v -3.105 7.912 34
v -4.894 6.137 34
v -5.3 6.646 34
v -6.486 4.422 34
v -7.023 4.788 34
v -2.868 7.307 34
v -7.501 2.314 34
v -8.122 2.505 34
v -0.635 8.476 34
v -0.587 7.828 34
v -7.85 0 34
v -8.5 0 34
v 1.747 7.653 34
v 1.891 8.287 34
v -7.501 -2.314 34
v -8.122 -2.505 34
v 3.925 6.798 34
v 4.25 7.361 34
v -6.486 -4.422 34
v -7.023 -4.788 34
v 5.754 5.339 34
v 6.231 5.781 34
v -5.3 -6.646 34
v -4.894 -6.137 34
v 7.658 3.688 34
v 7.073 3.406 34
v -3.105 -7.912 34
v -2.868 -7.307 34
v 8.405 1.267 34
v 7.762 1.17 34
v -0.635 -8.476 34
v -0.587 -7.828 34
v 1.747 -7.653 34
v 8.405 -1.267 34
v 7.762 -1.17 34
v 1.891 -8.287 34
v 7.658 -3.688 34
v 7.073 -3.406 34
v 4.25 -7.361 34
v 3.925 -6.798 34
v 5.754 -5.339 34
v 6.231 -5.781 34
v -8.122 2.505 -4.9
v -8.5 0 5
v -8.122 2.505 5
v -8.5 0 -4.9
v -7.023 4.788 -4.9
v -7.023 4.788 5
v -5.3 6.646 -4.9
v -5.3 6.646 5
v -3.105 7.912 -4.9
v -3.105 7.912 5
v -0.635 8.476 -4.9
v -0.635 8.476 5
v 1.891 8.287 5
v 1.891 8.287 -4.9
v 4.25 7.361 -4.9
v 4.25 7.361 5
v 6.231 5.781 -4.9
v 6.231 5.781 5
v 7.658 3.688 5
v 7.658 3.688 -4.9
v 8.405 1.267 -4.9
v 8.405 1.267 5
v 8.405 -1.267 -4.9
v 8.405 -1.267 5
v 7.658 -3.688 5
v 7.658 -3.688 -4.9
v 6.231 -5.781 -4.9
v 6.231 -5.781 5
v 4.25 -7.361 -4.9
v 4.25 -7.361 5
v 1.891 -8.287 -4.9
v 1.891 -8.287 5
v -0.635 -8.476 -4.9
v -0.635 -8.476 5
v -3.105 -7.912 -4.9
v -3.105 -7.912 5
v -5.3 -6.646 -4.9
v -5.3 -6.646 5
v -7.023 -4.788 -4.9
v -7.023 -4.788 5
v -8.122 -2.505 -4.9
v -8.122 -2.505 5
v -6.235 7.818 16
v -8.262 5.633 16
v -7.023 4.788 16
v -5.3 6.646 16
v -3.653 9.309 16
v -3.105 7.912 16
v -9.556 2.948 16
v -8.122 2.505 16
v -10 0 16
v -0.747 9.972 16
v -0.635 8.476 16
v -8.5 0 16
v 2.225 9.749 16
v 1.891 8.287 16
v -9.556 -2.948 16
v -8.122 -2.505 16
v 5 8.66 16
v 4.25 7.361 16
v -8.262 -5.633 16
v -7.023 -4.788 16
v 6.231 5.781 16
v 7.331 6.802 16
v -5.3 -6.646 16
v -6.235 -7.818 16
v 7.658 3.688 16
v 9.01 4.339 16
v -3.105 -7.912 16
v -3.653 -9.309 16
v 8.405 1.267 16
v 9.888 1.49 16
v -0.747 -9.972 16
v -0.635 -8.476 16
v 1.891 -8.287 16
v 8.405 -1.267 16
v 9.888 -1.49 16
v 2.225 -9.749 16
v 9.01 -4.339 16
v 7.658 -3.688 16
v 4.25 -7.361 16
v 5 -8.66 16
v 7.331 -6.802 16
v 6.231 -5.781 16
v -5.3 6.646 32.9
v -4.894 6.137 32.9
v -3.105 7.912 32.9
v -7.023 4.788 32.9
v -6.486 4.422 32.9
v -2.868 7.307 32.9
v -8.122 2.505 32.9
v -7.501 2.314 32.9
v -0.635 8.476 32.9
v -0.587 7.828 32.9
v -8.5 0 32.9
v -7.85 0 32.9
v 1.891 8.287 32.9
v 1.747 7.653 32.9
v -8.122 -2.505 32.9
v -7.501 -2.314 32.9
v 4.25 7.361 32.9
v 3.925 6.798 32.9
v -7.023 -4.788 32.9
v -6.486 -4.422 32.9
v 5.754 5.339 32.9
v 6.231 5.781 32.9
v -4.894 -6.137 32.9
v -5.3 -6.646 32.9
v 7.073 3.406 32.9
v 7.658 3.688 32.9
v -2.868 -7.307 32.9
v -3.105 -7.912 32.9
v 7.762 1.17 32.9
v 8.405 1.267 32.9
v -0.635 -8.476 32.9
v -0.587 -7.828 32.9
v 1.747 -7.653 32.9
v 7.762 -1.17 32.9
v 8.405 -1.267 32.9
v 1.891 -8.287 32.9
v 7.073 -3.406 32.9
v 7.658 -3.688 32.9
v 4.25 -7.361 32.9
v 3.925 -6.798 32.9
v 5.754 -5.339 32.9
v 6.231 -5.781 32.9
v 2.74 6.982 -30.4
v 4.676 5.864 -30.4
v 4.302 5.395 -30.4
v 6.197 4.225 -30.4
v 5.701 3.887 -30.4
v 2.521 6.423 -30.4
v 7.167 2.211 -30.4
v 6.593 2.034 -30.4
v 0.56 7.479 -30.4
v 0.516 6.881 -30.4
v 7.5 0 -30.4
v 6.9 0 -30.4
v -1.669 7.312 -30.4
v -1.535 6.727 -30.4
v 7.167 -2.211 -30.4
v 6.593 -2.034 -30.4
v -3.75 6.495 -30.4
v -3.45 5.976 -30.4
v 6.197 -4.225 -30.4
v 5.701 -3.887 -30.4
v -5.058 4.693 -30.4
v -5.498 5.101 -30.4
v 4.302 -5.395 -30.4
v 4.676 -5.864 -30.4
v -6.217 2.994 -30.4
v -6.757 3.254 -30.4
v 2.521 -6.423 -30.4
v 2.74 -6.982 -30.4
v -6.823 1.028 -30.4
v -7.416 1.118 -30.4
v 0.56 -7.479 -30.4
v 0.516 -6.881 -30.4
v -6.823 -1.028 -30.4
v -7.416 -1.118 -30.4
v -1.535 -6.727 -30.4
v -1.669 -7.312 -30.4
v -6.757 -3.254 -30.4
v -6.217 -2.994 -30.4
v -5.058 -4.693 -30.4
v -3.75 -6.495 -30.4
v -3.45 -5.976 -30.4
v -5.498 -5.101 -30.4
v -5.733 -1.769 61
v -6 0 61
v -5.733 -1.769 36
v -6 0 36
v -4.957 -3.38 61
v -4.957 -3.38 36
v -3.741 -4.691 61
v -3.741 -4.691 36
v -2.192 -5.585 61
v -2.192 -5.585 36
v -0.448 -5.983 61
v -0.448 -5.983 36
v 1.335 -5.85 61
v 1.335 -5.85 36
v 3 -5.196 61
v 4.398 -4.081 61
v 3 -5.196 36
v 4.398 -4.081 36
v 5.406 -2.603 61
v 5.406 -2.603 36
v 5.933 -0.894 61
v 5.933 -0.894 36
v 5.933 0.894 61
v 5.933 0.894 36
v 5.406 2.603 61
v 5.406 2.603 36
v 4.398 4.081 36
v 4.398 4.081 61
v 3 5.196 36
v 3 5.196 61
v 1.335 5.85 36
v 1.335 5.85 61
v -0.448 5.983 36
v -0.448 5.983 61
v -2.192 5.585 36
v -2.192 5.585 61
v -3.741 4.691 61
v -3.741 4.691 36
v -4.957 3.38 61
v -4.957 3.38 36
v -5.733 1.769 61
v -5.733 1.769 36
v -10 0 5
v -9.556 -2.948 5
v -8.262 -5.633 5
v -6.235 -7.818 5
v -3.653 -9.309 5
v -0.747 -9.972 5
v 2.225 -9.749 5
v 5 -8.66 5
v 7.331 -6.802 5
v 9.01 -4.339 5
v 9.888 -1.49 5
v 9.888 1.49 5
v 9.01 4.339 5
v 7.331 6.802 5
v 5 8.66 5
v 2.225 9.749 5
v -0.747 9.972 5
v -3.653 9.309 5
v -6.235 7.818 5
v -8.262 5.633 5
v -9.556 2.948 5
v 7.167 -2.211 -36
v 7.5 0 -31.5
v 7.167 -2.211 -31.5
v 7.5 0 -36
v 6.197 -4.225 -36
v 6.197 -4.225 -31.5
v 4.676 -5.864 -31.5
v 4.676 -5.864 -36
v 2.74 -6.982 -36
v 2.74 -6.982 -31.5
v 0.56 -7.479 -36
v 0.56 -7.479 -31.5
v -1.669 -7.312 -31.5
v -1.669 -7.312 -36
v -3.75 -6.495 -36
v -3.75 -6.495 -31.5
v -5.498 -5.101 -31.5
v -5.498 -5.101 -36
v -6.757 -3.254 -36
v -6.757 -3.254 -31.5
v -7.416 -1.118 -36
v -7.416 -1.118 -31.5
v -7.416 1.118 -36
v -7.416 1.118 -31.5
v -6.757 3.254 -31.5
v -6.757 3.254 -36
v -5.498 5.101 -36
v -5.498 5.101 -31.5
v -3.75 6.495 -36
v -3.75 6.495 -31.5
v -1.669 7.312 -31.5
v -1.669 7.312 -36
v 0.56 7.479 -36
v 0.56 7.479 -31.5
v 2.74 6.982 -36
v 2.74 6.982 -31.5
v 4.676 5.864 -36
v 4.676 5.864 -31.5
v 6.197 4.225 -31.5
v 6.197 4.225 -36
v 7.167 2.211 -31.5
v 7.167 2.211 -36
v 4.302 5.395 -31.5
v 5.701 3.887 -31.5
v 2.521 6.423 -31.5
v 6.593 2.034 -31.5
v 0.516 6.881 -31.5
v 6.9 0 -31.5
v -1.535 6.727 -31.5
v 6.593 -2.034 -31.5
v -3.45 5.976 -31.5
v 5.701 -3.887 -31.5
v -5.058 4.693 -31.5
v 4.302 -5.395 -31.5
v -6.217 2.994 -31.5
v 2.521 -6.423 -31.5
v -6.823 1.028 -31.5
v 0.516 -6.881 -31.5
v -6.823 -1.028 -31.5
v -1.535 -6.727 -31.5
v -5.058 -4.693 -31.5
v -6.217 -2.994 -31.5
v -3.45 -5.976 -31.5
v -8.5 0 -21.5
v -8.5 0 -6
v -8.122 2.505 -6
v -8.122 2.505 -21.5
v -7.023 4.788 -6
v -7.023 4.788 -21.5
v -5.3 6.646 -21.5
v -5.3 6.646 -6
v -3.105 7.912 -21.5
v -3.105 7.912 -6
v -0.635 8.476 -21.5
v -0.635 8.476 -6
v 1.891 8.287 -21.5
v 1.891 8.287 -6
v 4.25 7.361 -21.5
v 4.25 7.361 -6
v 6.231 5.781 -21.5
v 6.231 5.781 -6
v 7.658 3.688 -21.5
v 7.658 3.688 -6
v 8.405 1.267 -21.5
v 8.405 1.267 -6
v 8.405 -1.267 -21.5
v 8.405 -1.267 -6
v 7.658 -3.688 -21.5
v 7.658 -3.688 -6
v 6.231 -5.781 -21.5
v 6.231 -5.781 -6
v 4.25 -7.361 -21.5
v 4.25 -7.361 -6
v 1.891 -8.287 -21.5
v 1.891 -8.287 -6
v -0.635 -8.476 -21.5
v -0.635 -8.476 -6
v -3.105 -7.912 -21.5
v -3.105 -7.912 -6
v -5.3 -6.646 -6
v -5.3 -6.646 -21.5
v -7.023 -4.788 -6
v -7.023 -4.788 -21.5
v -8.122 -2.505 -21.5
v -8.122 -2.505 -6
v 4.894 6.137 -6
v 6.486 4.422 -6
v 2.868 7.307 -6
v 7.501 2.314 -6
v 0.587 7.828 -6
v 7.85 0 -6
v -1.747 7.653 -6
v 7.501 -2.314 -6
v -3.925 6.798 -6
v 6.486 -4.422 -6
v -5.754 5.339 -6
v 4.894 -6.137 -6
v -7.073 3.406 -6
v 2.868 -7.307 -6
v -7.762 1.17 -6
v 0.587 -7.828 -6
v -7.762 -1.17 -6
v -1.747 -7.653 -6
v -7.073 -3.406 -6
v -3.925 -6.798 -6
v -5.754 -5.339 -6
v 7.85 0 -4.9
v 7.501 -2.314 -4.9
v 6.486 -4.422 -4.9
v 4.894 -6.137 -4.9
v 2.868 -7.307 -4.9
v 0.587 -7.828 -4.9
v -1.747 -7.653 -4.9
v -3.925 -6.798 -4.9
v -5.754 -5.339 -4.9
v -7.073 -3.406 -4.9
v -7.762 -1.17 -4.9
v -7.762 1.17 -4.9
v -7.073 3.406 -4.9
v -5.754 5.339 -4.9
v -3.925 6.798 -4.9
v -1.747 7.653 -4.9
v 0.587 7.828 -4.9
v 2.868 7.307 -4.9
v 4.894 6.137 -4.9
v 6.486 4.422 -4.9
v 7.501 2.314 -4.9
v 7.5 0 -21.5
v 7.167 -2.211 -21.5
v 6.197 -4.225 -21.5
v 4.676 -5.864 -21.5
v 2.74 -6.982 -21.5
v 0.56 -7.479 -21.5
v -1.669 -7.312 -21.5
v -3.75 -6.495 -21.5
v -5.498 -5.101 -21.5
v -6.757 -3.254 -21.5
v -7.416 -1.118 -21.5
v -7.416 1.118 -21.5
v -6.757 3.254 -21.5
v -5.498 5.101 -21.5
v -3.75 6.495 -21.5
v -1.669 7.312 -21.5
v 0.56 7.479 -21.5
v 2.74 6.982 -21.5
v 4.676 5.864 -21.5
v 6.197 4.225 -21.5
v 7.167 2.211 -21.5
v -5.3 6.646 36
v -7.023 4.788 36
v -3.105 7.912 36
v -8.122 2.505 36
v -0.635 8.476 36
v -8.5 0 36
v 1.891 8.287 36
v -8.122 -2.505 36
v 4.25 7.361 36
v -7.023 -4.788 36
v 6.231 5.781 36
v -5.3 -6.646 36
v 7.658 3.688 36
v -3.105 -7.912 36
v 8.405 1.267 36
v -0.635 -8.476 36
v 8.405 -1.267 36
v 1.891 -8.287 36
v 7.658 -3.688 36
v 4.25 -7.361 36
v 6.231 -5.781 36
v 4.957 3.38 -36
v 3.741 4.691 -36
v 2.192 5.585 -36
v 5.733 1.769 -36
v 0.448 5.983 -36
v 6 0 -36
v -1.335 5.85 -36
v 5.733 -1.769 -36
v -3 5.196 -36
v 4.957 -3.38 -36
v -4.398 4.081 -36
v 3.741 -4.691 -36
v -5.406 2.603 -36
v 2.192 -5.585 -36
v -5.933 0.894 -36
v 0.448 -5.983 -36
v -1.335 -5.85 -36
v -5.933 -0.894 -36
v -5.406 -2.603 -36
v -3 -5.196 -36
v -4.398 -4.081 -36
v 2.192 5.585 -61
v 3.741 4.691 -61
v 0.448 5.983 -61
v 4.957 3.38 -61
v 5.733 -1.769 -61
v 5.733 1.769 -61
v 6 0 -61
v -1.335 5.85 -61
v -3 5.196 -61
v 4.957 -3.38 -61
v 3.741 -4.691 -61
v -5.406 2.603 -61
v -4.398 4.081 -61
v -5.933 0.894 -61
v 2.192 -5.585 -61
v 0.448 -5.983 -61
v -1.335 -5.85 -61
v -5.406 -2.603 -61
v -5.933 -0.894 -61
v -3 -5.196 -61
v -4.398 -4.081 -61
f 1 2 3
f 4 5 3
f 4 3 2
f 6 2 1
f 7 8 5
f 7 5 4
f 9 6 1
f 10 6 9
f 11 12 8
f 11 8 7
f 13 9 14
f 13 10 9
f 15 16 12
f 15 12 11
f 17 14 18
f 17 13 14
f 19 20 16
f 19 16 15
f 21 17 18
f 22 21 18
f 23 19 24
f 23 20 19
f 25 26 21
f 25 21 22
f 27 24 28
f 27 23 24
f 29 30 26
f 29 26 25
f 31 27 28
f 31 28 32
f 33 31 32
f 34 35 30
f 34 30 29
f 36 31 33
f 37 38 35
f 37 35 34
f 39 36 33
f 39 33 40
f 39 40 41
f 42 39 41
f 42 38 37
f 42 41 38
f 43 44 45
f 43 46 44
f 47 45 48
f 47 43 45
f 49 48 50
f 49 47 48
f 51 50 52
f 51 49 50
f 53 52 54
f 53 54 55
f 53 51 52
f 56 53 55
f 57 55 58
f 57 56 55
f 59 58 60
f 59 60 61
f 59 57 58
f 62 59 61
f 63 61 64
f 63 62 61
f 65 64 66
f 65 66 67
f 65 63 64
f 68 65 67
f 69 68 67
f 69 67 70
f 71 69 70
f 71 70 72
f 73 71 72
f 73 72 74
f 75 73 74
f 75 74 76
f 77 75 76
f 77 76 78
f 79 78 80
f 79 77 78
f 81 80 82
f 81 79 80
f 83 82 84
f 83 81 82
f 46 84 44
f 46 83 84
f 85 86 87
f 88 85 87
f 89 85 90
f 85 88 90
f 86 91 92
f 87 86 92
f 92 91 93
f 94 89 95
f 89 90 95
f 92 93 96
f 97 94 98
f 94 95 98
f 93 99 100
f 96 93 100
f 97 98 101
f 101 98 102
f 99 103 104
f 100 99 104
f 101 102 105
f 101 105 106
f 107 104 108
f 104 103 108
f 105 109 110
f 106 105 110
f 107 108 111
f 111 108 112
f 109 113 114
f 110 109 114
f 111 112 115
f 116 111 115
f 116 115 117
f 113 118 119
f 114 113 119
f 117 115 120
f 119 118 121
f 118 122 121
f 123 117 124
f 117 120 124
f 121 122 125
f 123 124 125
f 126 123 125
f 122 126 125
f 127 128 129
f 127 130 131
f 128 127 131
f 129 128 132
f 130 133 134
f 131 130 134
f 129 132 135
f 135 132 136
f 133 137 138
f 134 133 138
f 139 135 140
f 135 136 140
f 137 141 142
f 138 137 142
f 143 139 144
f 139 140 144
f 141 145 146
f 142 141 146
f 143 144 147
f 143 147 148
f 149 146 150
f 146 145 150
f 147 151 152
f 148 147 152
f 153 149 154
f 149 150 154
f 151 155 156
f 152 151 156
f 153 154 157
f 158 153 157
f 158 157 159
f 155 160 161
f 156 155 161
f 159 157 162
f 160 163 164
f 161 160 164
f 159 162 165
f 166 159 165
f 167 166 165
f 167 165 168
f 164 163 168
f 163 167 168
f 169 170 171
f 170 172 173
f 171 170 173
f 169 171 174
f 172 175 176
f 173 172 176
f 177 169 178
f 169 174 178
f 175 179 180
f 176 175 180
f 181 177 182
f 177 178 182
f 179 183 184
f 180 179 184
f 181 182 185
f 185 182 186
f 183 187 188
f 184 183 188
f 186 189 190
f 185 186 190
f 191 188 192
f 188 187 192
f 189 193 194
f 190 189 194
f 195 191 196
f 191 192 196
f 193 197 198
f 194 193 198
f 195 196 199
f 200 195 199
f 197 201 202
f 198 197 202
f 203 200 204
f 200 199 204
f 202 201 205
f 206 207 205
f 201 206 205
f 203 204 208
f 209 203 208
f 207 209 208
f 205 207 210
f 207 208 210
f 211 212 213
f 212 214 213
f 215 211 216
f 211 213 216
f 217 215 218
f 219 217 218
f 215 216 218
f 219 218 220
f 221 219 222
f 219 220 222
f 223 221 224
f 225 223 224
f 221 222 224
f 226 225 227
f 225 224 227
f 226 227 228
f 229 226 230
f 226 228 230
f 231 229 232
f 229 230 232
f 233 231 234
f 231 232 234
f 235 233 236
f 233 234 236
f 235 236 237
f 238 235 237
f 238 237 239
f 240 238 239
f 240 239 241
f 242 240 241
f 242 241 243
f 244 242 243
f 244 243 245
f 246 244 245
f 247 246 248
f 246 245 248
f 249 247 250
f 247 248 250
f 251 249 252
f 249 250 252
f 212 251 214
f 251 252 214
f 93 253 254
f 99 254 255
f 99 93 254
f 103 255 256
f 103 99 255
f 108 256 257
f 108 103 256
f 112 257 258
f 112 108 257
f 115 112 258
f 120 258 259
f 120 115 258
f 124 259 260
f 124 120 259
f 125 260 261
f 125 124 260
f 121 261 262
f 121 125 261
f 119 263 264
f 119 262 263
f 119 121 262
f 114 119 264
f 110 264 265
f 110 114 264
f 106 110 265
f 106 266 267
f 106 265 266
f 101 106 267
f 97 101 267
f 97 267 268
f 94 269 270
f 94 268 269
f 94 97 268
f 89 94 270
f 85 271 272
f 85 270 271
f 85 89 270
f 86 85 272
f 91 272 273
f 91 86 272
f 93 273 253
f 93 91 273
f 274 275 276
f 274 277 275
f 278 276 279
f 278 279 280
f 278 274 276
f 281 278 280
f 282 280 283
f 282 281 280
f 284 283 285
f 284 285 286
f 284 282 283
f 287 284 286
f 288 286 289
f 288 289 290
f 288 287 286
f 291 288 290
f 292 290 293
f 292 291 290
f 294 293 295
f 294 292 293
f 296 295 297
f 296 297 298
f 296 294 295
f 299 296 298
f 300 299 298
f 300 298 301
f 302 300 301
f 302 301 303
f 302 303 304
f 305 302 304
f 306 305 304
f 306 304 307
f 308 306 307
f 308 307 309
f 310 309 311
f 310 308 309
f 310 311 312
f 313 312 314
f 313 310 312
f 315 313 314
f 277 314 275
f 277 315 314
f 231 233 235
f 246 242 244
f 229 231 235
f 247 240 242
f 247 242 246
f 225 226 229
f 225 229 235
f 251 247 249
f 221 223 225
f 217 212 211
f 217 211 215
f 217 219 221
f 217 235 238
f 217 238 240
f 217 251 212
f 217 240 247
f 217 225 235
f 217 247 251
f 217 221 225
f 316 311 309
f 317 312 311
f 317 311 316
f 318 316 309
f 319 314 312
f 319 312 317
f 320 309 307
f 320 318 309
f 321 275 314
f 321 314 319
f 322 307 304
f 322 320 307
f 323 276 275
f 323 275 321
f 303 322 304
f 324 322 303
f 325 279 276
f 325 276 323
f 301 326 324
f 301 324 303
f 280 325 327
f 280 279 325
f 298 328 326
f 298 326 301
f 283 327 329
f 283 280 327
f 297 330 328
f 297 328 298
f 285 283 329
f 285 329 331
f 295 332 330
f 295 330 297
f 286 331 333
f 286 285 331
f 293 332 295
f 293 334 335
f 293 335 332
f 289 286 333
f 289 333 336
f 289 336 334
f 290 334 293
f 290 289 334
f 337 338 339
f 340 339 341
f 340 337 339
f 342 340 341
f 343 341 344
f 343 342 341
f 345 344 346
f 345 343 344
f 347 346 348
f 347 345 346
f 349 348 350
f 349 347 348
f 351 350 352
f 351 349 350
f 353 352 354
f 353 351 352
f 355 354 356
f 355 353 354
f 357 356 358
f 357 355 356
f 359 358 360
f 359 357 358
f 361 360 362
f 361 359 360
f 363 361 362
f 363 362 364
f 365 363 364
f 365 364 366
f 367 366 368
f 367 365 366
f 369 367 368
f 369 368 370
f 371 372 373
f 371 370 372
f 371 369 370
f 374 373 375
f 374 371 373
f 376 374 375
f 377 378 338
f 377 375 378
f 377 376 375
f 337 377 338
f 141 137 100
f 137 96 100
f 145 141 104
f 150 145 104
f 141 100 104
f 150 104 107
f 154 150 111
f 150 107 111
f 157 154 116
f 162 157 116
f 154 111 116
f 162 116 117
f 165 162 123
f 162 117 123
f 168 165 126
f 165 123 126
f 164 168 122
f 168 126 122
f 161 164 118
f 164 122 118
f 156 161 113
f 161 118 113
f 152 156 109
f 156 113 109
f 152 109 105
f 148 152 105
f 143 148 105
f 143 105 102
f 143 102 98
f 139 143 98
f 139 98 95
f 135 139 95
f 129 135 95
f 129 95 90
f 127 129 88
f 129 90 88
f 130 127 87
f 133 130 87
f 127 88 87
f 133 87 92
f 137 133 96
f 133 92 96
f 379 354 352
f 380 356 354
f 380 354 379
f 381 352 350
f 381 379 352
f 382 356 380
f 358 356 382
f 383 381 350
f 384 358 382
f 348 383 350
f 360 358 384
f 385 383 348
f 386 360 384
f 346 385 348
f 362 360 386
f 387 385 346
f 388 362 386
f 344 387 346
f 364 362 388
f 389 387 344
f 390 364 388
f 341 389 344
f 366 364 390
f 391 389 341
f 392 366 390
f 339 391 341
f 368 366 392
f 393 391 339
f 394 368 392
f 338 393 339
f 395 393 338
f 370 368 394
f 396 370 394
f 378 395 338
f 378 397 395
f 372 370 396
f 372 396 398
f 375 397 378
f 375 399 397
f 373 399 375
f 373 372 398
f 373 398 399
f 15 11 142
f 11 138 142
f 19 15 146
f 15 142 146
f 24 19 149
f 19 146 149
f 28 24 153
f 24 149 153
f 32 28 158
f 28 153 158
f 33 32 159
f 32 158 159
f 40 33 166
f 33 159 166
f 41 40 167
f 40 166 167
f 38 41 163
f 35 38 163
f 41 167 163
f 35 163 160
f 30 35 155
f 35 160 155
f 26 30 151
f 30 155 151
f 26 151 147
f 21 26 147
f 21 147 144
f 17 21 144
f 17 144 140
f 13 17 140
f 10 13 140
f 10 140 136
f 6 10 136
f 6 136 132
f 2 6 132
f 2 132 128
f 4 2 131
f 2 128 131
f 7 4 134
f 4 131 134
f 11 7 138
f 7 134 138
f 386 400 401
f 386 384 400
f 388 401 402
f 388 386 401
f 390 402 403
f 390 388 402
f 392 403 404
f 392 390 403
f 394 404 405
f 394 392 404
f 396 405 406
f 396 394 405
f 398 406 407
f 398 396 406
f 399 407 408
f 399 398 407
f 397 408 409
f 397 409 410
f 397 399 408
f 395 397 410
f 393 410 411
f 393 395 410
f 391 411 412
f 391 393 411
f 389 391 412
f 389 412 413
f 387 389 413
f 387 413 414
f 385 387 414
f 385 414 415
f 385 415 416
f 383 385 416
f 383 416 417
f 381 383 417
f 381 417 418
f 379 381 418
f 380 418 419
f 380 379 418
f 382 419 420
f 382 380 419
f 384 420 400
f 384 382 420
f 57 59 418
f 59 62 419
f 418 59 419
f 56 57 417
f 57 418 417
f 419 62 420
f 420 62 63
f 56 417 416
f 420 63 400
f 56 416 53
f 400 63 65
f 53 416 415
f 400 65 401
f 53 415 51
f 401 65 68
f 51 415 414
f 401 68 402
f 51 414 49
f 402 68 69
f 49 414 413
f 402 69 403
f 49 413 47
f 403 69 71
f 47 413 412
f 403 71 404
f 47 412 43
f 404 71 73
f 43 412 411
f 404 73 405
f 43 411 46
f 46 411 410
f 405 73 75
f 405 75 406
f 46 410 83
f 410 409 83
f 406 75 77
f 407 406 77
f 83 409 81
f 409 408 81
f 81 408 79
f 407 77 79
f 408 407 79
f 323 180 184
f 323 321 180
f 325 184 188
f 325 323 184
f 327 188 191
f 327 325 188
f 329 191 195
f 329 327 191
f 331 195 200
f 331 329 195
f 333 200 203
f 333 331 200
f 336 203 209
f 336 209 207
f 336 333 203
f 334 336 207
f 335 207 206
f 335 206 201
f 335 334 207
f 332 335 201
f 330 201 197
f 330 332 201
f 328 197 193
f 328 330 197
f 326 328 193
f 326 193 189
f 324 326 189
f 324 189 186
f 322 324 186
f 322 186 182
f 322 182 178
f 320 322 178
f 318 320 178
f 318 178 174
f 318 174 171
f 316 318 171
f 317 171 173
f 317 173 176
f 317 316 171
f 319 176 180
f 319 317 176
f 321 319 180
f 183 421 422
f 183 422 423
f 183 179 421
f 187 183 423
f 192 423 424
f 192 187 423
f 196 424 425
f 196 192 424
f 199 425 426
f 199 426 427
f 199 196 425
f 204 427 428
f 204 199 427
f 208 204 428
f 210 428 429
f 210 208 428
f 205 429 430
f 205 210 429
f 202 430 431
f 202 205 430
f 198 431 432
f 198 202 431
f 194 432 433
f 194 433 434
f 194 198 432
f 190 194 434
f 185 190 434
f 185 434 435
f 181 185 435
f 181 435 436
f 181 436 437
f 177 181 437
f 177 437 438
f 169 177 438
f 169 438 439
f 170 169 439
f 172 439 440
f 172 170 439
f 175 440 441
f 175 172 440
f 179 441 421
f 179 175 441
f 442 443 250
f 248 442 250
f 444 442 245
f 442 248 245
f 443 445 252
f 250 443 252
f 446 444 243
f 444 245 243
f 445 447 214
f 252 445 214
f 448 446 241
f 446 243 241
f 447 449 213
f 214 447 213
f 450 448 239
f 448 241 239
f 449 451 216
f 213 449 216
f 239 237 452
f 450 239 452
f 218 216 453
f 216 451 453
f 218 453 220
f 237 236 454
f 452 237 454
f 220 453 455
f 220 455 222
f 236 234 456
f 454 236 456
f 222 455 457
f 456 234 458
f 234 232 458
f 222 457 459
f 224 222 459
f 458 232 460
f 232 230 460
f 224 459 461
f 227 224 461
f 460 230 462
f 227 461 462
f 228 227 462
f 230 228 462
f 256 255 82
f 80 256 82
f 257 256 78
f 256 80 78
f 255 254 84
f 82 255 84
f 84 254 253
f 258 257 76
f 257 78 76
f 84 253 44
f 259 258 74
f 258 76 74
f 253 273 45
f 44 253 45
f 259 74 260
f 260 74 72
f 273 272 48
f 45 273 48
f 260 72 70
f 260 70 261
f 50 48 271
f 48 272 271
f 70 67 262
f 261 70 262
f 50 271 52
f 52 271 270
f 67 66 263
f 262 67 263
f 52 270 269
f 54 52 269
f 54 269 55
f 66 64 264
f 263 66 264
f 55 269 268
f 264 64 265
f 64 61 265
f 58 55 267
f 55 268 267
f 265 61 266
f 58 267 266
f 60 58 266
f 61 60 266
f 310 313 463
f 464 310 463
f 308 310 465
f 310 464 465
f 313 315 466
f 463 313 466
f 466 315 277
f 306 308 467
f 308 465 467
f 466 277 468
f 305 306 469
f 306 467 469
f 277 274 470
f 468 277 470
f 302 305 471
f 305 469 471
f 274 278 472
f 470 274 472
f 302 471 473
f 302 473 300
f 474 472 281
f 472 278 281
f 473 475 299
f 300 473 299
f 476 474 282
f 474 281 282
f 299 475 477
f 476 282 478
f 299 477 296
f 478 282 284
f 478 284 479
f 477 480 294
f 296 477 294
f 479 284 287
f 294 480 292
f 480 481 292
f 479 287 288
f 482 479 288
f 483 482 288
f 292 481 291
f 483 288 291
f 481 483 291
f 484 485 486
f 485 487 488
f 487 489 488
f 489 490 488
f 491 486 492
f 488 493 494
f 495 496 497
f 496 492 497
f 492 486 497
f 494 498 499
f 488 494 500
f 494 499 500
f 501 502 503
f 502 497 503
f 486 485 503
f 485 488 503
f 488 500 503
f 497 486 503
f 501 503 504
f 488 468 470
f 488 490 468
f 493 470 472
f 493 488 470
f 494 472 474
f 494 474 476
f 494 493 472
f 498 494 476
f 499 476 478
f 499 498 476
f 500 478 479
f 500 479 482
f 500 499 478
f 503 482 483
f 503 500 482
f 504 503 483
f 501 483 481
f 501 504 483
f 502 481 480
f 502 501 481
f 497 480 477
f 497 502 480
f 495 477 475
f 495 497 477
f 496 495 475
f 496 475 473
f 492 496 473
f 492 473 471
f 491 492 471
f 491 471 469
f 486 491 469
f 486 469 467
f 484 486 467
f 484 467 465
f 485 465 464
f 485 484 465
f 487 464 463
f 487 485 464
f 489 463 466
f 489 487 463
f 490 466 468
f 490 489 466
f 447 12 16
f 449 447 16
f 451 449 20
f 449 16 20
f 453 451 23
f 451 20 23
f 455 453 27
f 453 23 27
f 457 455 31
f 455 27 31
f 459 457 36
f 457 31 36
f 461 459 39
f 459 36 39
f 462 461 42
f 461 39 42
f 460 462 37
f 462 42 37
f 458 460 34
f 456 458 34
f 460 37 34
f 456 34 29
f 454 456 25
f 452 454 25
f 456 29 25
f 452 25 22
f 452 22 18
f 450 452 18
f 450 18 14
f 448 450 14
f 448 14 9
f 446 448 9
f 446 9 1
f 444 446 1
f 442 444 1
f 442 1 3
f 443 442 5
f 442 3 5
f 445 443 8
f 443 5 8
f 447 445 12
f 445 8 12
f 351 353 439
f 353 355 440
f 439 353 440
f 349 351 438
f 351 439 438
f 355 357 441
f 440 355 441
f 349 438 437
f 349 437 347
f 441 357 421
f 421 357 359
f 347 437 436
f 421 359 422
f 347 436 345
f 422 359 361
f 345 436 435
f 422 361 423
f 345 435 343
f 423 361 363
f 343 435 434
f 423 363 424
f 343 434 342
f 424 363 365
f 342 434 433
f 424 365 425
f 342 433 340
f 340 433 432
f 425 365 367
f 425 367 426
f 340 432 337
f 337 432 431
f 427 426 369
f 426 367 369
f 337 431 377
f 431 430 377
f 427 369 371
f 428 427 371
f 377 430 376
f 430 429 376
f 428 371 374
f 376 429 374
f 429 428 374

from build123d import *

# Parameters (mm, degrees)
SKETCH1_R           = 10
BOSS_EXTRUDE1_DEPTH = 61
SKETCH3_W           = 66
SKETCH3_H           = 1.5
SKETCH4_W           = 45
SKETCH4_H           = 1.5
SKETCH5_W           = 25
SKETCH5_H           = 2.5
SKETCH6_W           = 39.5
SKETCH6_H           = 1
SKETCH7_W           = 25
SKETCH7_H           = 1.5
SKETCH8_W           = 1.1
SKETCH8_H           = 0.6
SKETCH9_W           = 1.1
SKETCH9_H           = 0.65
SKETCH10_W          = 1.1
SKETCH10_H          = 0.65


with BuildPart() as part:
    # Sketch1 → Boss-Extrude1 (new, symmetric)
    with BuildSketch(Plane.XY):
        with Locations(Location((0, 0, 0), (0, 0, 180))):
            Circle(SKETCH1_R)
    extrude(amount=BOSS_EXTRUDE1_DEPTH, both=True)

    # Sketch3 → Cut-Revolve1 (revolve, cut)
    with BuildSketch(Plane(origin=(0, 0, 0), x_dir=(0, 0, -1), z_dir=(1, 0, 0)), mode=Mode.PRIVATE) as cut_revolve1_sk:
        with Locations((28, 9.25)):
            Rectangle(SKETCH3_W, SKETCH3_H)
    revolve(cut_revolve1_sk.sketch.rotate(Axis((0, 0, 0), (0, 0, -1)), 270), axis=Axis((0, 0, 0), (0, 0, -1)), mode=Mode.SUBTRACT)

    # Sketch4 → Cut-Revolve2 (revolve, cut)
    with BuildSketch(Plane(origin=(0, 0, 0), x_dir=(0, 0, -1), z_dir=(1, 0, 0)), mode=Mode.PRIVATE) as cut_revolve2_sk:
        with Locations((-38.5, 9.25)):
            Rectangle(SKETCH4_W, SKETCH4_H)
    revolve(cut_revolve2_sk.sketch.rotate(Axis((0, 0, 0), (0, 0, 1)), 90), axis=Axis((0, 0, 0), (0, 0, 1)), mode=Mode.SUBTRACT)

    # Sketch5 → Cut-Revolve3 (revolve, cut)
    with BuildSketch(Plane(origin=(0, 0, 0), x_dir=(0, 0, -1), z_dir=(1, 0, 0)), mode=Mode.PRIVATE) as cut_revolve3_sk:
        with Locations((-48.5, 7.25)):
            Rectangle(SKETCH5_W, SKETCH5_H)
    revolve(cut_revolve3_sk.sketch.rotate(Axis((0, 0, 0), (0, 0, 1)), 90), axis=Axis((0, 0, 0), (0, 0, 1)), mode=Mode.SUBTRACT)

    # Sketch6 → Cut-Revolve4 (revolve, cut)
    with BuildSketch(Plane(origin=(0, 0, 0), x_dir=(0, 0, -1), z_dir=(1, 0, 0)), mode=Mode.PRIVATE) as cut_revolve4_sk:
        with Locations((41.25, 8)):
            Rectangle(SKETCH6_W, SKETCH6_H)
    revolve(cut_revolve4_sk.sketch.rotate(Axis((0, 0, 0), (0, 0, -1)), 90), axis=Axis((0, 0, 0), (0, 0, -1)), mode=Mode.SUBTRACT)

    # Sketch7 → Cut-Revolve5 (revolve, cut)
    with BuildSketch(Plane(origin=(0, 0, 0), x_dir=(0, 0, -1), z_dir=(1, 0, 0)), mode=Mode.PRIVATE) as cut_revolve5_sk:
        with Locations((48.5, 6.75)):
            Rectangle(SKETCH7_W, SKETCH7_H)
    revolve(cut_revolve5_sk.sketch.rotate(Axis((0, 0, 0), (0, 0, -1)), 90), axis=Axis((0, 0, 0), (0, 0, -1)), mode=Mode.SUBTRACT)

    # Sketch8 → Cut-Revolve6 (revolve, cut)
    with BuildSketch(Plane(origin=(0, 0, 0), x_dir=(0, 0, -1), z_dir=(1, 0, 0)), mode=Mode.PRIVATE) as cut_revolve6_sk:
        with Locations((30.95, 7.2)):
            Rectangle(SKETCH8_W, SKETCH8_H)
    revolve(cut_revolve6_sk.sketch.rotate(Axis((0, 0, 0), (0, 0, -1)), 90), axis=Axis((0, 0, 0), (0, 0, -1)), mode=Mode.SUBTRACT)

    # Sketch9 → Cut-Revolve7 (revolve, cut)
    with BuildSketch(Plane(origin=(0, 0, 0), x_dir=(0, 0, -1), z_dir=(1, 0, 0)), mode=Mode.PRIVATE) as cut_revolve7_sk:
        with Locations((5.45, 8.175)):
            Rectangle(SKETCH9_W, SKETCH9_H)
    revolve(cut_revolve7_sk.sketch.rotate(Axis((0, 0, 0), (0, 0, -1)), 90), axis=Axis((0, 0, 0), (0, 0, -1)), mode=Mode.SUBTRACT)

    # Sketch10 → Cut-Revolve8 (revolve, cut)
    with BuildSketch(Plane(origin=(0, 0, 0), x_dir=(0, 0, -1), z_dir=(1, 0, 0)), mode=Mode.PRIVATE) as cut_revolve8_sk:
        with Locations((-33.45, 8.175)):
            Rectangle(SKETCH10_W, SKETCH10_H)
    revolve(cut_revolve8_sk.sketch.rotate(Axis((0, 0, 0), (0, 0, 1)), 90), axis=Axis((0, 0, 0), (0, 0, 1)), mode=Mode.SUBTRACT)


solid = part.part
